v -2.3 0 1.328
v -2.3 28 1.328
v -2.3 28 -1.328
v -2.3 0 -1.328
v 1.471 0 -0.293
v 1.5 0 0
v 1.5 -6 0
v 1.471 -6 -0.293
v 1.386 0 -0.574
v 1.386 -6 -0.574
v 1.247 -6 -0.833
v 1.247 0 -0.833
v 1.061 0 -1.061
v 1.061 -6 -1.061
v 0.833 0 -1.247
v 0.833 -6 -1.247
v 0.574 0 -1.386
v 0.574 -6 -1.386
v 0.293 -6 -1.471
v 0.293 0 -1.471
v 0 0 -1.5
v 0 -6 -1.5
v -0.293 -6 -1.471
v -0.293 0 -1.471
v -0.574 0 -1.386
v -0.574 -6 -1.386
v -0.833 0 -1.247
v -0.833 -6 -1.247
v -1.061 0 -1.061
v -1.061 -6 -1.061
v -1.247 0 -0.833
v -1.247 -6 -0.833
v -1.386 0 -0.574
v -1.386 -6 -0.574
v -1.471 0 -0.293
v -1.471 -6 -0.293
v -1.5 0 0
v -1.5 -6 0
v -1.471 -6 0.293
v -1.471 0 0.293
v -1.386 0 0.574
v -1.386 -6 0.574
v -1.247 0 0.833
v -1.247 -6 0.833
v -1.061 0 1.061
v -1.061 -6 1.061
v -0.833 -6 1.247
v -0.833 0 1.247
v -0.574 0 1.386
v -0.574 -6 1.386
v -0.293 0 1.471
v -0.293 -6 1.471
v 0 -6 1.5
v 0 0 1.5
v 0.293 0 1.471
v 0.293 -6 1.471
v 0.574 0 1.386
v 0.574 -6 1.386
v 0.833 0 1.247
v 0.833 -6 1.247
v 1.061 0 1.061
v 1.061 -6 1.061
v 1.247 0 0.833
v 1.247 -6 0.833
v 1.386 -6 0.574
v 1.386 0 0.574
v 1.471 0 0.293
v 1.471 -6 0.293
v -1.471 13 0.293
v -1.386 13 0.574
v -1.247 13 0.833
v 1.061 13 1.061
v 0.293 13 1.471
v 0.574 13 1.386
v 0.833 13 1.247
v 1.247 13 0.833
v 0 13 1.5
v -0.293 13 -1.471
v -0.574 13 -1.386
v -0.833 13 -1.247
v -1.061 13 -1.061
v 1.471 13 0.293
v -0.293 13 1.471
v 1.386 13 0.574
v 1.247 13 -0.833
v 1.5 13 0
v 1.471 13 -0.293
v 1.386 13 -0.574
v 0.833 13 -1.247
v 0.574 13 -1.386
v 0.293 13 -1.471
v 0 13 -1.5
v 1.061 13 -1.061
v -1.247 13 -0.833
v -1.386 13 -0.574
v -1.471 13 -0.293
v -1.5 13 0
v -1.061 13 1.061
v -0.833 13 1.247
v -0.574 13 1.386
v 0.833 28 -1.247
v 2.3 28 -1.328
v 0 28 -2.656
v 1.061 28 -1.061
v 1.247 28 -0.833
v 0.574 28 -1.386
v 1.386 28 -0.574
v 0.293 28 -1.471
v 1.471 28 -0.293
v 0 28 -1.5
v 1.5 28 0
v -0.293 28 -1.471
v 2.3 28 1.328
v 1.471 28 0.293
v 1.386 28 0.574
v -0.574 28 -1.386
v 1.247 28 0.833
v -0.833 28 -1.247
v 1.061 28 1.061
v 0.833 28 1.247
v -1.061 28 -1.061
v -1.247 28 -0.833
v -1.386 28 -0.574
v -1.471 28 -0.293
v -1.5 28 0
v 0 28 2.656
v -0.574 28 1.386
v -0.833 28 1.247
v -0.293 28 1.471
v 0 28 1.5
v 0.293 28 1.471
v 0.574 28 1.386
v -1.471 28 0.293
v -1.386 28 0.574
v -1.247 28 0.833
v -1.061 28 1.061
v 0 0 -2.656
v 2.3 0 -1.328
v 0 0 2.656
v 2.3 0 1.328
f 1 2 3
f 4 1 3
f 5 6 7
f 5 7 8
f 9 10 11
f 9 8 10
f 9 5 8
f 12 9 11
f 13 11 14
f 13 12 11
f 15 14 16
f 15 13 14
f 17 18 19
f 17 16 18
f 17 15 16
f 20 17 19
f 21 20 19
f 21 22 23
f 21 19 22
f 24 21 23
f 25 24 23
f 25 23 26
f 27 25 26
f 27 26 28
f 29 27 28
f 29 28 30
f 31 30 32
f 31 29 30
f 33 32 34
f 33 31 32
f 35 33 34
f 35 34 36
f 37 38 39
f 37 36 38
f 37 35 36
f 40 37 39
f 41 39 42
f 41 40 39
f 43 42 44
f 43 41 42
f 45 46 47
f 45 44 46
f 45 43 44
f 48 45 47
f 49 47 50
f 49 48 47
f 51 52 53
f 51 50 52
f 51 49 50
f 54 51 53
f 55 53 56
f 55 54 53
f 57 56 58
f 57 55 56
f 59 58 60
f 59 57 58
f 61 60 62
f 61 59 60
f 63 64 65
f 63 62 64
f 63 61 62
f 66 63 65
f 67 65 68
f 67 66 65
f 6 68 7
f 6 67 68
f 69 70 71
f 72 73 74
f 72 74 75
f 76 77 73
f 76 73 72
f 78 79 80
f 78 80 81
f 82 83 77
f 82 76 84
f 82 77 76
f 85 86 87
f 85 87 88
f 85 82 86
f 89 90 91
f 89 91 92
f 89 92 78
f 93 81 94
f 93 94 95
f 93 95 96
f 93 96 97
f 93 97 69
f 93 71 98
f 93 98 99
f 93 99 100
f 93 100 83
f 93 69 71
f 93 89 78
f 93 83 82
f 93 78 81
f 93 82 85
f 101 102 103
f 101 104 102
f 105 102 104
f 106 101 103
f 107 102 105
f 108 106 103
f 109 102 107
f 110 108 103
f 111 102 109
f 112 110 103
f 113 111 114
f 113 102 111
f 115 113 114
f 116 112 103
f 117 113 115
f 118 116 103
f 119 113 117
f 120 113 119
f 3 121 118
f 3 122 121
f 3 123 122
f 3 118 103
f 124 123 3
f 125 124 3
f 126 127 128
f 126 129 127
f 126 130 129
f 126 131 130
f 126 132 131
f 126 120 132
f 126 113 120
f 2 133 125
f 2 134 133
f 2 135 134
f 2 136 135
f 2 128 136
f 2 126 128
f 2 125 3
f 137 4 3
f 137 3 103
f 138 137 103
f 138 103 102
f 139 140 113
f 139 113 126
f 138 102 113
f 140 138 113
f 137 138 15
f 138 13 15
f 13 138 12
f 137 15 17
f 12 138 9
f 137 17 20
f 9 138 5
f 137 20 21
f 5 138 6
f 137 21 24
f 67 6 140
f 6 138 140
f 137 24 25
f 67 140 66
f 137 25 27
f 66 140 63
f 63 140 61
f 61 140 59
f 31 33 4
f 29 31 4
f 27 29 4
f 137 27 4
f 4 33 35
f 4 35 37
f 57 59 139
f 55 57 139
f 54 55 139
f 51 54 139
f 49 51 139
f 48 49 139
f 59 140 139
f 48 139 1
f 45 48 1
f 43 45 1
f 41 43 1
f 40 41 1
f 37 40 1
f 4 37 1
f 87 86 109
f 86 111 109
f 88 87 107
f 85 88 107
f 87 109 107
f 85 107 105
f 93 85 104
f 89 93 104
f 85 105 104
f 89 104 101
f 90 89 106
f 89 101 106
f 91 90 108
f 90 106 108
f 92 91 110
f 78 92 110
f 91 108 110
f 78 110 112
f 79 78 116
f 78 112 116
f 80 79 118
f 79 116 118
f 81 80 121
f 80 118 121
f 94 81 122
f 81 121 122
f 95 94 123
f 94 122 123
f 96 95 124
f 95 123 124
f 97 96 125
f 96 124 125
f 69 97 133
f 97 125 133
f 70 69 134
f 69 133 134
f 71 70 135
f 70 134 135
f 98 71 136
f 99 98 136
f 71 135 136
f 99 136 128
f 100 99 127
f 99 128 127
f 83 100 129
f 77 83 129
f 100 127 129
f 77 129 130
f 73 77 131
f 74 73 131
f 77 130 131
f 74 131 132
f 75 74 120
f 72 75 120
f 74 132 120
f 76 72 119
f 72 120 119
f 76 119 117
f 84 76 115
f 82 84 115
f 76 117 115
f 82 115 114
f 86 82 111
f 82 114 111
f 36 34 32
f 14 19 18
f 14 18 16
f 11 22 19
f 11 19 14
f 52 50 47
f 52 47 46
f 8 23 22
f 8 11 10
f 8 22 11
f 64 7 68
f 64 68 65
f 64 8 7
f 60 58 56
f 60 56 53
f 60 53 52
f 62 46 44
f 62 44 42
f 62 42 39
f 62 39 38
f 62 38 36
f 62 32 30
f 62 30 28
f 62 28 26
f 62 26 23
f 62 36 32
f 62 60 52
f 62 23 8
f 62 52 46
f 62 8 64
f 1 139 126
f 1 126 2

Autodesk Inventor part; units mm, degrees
ref_plane "YZ Plane" through (0, 0, 0) normal (1, 0, 0) x (0, 1, 0)
ref_plane "XZ Plane" through (0, 0, 0) normal (0, 1, 0) x (-1, 0, 0)
ref_plane "XY Plane" through (0, 0, 0) normal (0, 0, 1) x (1, 0, 0)
sketch "Sketch1" plane through (0, 0, 0) normal (0, 1, 0) x (-1, 0, 0)
  line L0 (0, -2.6558) -> (-2.3, -1.3279)
  line L1 (-2.3, -1.3279) -> (-2.3, 1.3279)
  line L2 (-2.3, 1.3279) -> (0, 2.6558)
  line L3 (0, 2.6558) -> (2.3, 1.3279)
  line L4 (2.3, 1.3279) -> (2.3, -1.3279)
  line L5 (2.3, -1.3279) -> (0, -2.6558)
  point P0 (0, 0)
  point P1 (0, 0)
  dimension "d0" = 4.6
extrude "Extrusion1" add sketch "Sketch1" along normal blind 28
sketch "Sketch2" plane through (0, 28, 0) normal (0, 1, 0) x (1, 0, 0)
  circle A0 centre (0, 0) radius 1.5
  dimension "d3" = 3
extrude "Extrusion2" cut sketch "Sketch2" against normal blind 15
sketch "Sketch3" plane through (0, 0, 0) normal (0, -1, 0) x (1, 0, 0)
  circle A0 centre (0, 0) radius 1.5
  dimension "d6" = 3
extrude "Extrusion3" add sketch "Sketch3" along normal blind 6
properties part number "M3_28_MM_STANDOFF_PIN"
